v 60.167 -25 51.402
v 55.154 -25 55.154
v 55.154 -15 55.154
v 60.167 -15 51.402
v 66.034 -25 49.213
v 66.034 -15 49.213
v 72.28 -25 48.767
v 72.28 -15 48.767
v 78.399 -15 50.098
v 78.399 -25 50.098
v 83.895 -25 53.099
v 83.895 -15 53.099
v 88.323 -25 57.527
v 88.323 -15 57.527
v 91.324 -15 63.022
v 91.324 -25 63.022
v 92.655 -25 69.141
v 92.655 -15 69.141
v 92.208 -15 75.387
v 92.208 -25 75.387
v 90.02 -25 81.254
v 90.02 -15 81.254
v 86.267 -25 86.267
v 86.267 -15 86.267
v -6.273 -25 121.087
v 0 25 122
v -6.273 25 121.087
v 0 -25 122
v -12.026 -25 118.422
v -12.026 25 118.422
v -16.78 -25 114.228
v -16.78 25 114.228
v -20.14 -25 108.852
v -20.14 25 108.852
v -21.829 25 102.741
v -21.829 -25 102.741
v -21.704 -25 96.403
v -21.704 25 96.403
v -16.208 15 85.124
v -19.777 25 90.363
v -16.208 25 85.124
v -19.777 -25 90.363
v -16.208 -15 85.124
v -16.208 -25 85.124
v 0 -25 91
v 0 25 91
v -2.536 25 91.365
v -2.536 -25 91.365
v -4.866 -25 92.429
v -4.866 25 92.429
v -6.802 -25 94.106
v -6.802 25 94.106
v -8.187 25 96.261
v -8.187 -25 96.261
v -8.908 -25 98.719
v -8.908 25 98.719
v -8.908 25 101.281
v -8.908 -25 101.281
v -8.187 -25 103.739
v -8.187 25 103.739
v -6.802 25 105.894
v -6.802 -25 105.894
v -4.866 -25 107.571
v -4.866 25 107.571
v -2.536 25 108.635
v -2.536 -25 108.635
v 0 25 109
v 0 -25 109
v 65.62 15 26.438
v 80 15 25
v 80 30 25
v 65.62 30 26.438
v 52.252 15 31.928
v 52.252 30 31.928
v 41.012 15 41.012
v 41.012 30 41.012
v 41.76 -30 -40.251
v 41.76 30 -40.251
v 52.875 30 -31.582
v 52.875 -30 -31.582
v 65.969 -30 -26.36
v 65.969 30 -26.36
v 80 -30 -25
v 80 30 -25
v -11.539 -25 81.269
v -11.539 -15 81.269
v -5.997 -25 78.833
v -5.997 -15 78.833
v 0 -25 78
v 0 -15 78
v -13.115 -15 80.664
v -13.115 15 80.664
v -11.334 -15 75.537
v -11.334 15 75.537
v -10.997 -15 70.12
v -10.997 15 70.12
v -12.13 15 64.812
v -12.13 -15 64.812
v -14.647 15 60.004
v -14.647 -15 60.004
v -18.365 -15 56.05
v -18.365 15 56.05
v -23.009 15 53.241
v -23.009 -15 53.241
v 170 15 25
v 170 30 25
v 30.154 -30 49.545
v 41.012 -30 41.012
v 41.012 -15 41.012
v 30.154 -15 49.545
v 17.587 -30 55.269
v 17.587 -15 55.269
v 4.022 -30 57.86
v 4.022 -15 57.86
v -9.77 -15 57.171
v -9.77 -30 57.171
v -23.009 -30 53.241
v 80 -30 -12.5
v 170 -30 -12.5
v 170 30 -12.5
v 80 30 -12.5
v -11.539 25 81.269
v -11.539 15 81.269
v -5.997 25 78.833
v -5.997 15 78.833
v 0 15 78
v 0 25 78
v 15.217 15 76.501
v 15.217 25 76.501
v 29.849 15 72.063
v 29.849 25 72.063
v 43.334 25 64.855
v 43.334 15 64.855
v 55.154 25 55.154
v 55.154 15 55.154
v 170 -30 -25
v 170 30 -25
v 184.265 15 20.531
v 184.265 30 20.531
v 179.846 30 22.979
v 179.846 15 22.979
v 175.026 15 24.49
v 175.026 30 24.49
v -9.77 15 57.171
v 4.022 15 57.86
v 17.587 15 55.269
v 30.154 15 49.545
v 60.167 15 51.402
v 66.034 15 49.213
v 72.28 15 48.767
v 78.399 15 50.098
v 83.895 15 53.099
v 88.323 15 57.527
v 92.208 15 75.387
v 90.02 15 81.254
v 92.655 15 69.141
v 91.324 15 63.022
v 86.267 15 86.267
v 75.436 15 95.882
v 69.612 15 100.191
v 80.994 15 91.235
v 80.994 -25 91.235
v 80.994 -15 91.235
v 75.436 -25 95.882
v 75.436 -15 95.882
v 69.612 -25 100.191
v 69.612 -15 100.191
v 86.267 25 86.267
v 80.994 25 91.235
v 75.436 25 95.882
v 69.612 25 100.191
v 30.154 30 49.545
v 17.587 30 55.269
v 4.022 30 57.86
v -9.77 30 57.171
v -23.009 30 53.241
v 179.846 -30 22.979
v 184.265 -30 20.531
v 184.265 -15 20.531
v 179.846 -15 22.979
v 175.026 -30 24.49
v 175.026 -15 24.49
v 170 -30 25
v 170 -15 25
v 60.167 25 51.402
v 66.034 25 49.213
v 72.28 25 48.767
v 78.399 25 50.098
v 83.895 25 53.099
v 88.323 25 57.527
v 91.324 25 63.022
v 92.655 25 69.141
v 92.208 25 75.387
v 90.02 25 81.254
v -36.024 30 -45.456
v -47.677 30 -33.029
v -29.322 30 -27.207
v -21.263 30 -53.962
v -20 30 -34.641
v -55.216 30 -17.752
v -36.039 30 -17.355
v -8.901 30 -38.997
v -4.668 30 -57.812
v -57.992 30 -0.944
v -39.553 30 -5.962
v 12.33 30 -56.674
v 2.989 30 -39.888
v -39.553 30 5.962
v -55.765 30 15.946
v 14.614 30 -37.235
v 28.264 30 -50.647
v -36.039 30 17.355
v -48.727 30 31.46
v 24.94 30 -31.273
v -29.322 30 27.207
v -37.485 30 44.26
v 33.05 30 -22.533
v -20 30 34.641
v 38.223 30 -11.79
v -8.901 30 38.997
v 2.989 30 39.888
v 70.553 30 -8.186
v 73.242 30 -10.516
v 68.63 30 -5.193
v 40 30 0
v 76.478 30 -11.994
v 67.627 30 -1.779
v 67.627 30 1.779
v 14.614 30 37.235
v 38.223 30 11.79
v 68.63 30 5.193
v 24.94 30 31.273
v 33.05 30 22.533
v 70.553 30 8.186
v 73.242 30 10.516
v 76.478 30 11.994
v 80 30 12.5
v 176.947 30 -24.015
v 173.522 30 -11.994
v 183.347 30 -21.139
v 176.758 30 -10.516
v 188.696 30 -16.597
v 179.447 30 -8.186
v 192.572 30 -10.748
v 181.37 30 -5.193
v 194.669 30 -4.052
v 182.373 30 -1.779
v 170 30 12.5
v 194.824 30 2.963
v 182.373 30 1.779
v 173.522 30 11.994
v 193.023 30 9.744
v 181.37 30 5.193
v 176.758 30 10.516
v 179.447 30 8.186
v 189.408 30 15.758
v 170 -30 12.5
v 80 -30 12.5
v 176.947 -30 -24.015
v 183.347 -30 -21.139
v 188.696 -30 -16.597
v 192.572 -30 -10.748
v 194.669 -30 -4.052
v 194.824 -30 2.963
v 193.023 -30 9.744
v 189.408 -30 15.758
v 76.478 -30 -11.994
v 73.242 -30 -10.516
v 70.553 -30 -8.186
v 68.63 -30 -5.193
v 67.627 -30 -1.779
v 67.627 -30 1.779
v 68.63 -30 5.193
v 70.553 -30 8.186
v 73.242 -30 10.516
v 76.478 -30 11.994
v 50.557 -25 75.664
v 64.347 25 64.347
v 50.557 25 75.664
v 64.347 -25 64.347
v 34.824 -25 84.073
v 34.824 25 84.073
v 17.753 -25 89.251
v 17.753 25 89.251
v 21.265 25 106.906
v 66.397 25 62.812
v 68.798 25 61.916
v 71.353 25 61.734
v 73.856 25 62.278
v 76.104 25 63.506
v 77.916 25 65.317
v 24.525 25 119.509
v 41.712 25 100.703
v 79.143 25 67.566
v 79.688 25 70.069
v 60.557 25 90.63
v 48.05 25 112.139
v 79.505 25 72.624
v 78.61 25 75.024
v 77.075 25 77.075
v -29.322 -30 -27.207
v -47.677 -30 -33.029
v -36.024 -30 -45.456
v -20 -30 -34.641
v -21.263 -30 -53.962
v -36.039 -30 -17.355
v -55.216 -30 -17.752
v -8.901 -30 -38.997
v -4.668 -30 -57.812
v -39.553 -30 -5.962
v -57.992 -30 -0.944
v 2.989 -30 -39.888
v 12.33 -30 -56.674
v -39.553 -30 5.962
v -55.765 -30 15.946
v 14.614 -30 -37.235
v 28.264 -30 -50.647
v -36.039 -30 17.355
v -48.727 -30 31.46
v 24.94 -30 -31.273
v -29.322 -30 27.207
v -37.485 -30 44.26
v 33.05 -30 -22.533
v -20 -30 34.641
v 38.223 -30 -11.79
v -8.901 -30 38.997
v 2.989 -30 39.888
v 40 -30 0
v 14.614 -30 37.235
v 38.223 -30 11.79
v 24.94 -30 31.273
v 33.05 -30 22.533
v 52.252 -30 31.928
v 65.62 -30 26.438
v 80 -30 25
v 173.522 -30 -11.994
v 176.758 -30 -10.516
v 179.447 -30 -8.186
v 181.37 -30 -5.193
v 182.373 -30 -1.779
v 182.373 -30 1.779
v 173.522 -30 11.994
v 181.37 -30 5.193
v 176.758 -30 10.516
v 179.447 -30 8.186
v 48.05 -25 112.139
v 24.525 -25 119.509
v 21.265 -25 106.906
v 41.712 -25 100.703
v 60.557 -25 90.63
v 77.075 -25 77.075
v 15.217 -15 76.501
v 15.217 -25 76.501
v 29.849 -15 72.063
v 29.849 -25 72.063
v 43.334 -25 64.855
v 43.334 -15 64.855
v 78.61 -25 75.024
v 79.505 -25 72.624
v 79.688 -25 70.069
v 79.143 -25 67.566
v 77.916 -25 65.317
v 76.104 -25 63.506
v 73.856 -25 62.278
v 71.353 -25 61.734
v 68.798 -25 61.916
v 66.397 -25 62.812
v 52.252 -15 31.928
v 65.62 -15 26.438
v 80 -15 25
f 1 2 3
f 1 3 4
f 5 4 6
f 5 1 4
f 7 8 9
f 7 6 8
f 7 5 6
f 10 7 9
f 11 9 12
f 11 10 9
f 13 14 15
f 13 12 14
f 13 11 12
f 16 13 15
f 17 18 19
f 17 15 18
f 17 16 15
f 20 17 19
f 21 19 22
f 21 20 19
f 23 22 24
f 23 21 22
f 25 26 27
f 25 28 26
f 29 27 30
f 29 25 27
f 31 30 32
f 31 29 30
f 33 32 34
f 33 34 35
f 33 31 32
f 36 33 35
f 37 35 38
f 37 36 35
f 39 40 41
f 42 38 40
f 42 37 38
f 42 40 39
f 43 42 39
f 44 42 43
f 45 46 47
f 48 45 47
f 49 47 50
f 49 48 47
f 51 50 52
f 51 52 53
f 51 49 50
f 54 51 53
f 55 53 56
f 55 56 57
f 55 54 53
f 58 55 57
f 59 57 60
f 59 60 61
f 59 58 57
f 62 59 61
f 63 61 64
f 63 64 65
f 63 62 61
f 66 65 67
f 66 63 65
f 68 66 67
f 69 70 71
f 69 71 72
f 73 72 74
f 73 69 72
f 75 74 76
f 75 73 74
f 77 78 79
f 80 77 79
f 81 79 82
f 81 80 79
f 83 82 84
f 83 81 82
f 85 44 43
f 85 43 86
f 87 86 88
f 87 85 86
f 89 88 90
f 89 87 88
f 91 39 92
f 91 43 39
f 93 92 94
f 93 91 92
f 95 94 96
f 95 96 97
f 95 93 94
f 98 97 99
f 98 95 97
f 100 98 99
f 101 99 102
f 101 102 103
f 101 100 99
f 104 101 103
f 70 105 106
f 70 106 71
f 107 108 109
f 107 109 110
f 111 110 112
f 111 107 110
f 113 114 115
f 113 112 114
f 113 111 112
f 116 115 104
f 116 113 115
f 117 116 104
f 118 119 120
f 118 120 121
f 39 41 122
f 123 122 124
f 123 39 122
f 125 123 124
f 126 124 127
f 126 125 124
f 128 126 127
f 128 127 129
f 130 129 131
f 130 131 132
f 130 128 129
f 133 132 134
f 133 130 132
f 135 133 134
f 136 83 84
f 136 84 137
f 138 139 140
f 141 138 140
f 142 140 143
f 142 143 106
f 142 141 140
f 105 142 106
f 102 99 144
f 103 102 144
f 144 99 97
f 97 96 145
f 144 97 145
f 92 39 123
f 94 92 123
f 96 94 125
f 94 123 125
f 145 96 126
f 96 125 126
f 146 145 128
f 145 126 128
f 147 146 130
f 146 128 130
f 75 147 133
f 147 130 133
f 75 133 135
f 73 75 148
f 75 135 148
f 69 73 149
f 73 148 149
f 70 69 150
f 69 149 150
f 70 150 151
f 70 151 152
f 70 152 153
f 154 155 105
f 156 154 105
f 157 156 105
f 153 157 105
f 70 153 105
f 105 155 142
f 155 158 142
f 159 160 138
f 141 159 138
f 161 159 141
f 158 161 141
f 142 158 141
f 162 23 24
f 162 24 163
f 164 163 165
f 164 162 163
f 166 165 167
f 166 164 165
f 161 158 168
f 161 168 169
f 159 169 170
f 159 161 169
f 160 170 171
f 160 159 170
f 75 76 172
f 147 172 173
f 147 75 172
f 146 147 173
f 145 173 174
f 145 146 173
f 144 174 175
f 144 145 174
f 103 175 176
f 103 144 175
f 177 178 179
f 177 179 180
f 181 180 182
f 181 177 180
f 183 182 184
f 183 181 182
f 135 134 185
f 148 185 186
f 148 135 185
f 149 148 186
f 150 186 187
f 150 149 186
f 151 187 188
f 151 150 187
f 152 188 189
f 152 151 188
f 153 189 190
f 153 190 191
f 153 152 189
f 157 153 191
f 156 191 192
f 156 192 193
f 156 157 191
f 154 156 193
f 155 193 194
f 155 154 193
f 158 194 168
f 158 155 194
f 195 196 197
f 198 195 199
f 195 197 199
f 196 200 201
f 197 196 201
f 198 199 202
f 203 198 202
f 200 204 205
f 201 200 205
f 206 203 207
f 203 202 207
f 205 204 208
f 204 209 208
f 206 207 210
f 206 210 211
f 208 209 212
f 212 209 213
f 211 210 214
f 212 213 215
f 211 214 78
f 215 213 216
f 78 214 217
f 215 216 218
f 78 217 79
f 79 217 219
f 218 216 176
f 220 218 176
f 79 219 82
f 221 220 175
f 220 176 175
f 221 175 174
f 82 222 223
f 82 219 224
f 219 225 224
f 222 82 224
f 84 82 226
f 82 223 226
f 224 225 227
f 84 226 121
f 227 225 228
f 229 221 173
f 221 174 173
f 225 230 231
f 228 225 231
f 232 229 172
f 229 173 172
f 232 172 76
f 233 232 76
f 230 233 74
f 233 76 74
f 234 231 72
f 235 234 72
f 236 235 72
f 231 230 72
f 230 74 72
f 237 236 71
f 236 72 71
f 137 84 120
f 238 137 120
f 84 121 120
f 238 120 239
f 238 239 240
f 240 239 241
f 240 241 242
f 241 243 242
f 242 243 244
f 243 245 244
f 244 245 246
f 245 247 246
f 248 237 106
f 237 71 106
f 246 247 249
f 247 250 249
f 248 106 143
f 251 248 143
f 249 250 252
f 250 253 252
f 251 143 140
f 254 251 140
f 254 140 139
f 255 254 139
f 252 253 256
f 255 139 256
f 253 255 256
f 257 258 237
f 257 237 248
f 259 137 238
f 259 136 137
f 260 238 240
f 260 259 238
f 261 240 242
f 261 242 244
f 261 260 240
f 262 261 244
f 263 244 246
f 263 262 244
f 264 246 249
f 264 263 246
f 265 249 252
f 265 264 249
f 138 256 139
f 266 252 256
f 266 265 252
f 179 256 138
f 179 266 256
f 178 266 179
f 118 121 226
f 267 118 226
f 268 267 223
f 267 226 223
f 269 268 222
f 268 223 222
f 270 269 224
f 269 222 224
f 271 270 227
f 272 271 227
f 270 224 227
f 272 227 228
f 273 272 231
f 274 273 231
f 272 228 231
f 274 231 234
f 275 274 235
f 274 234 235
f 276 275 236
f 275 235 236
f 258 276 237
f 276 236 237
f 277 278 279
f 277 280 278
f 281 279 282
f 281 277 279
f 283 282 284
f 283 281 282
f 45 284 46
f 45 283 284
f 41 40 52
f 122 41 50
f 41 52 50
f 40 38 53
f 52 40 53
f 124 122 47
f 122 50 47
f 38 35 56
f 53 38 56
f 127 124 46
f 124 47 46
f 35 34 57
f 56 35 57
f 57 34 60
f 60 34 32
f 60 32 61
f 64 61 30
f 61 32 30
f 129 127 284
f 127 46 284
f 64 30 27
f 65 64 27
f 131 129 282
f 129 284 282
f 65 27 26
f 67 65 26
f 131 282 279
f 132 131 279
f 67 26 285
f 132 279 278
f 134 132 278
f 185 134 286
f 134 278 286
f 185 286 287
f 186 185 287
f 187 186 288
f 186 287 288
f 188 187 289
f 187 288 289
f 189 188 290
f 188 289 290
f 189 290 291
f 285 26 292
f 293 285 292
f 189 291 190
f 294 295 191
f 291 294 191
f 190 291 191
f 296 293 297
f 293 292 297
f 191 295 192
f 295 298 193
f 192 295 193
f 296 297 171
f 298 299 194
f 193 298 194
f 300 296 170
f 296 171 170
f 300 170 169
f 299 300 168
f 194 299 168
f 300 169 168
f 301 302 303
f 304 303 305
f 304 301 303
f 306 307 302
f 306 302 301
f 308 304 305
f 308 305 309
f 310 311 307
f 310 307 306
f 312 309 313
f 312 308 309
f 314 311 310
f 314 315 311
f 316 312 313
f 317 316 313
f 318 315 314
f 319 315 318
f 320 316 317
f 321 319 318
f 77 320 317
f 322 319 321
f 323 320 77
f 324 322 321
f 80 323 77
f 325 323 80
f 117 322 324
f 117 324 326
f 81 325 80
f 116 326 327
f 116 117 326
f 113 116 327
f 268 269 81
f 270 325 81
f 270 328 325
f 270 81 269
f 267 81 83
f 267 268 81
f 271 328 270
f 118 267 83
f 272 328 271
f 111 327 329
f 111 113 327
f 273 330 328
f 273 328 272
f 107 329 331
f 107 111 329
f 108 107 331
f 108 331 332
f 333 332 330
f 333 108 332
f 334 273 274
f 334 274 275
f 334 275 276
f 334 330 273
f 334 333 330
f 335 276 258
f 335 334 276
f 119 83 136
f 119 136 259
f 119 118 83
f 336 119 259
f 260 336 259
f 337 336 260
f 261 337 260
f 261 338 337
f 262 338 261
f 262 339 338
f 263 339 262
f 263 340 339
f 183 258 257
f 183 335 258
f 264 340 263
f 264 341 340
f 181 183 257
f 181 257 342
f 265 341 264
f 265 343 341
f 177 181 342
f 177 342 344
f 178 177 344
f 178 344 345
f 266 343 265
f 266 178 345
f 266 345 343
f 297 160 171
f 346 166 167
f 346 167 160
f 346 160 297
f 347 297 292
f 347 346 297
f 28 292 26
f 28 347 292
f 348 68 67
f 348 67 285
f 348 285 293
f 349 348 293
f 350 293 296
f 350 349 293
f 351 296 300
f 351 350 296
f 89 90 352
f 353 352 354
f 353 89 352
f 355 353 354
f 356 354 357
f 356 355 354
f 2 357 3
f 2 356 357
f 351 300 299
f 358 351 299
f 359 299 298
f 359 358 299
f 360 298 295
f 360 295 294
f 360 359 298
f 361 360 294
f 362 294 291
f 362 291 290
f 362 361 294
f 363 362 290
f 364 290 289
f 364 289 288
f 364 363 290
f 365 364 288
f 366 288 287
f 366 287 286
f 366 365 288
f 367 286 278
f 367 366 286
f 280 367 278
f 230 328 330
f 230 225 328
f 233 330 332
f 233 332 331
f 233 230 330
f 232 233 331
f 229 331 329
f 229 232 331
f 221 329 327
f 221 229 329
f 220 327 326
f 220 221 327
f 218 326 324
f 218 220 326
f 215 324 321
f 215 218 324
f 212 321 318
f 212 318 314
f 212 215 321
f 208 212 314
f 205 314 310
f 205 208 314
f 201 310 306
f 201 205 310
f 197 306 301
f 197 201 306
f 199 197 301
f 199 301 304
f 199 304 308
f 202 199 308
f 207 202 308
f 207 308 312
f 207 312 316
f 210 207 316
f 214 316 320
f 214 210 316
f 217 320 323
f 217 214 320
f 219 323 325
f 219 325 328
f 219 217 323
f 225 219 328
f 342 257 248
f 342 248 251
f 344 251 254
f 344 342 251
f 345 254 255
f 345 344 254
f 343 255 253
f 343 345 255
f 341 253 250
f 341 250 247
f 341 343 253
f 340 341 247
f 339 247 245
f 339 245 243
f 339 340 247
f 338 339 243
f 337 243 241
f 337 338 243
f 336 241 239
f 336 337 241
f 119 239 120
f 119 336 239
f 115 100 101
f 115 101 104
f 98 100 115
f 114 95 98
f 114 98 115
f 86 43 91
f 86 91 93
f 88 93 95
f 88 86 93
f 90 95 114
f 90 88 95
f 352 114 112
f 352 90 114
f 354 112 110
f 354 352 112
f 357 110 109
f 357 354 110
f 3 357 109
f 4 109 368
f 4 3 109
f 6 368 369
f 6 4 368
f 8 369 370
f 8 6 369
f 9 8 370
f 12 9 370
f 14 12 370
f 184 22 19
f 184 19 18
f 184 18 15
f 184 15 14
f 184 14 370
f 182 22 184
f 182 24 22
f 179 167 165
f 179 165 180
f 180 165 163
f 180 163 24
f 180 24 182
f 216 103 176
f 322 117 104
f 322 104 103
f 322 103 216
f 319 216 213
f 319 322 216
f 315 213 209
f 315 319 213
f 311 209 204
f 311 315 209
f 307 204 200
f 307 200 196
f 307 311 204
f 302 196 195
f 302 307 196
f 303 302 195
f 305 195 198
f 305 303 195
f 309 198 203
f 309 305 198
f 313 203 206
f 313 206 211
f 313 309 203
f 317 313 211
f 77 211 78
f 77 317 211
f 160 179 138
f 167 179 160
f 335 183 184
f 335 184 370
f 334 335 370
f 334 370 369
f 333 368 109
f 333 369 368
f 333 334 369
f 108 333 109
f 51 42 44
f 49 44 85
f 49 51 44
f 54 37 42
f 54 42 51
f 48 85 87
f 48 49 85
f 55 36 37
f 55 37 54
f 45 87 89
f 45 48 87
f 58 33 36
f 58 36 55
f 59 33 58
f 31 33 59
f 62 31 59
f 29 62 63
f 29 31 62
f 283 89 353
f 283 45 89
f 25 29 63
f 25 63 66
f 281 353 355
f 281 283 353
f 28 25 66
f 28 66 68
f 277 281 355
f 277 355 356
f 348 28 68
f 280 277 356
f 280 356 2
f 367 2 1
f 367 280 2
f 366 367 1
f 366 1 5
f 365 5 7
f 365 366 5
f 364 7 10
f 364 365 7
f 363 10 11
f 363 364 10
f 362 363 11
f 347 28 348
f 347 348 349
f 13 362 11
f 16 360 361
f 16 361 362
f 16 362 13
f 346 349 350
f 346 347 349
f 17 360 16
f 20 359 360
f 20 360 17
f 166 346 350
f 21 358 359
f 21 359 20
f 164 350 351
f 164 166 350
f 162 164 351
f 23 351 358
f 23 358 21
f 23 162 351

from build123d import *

# Parameters (mm, degrees)
F0_R     = 40
F1_DEPTH = 30
F2_DEPTH = 15
F3_DEPTH = 25


with BuildPart() as f1:
    # F0 (on Front) → F1 (new body, symmetric)
    with BuildSketch(Plane.XZ):
        with BuildLine():
            ThreePointArc((80, 25), (58.736468, 28.697259), (41.012193, 41.012193))
            ThreePointArc((41.012193, 41.012193), (10.882045, 56.970002), (-23.008546, 53.241026))
            ThreePointArc((-23.008546, 53.241026), (-47.67685, -33.029047), (41.759702, -40.250805))
            ThreePointArc((41.759702, -40.250805), (59.237365, -28.506986), (80, -25))
            Line((80, -25), (170, -25))
            ThreePointArc((170, -25), (193.856579, -7.474199), (184.264706, 20.530908))
            ThreePointArc((184.264706, 20.530908), (177.474199, 23.856579), (170, 25))
            Line((170, 25), (80, 25))
        make_face()
        Circle(F0_R, mode=Mode.SUBTRACT)
        with BuildLine():
            ThreePointArc((80, -12.5), (67.5, 0), (80, 12.5))
            Line((80, 12.5), (170, 12.5))
            ThreePointArc((170, 12.5), (182.5, 0), (170, -12.5))
            Line((170, -12.5), (80, -12.5))
        make_face(mode=Mode.SUBTRACT)
    extrude(amount=F1_DEPTH, both=True)

    # F0 (on Front) → F2 (join, symmetric)
    with BuildSketch(Plane.XZ):
        with BuildLine():
            ThreePointArc((-23.008546, 53.241026), (10.882045, 56.970002), (41.012193, 41.012193))
            ThreePointArc((41.012193, 41.012193), (58.736468, 28.697259), (80, 25))
            Line((80, 25), (170, 25))
            ThreePointArc((170, 25), (177.474199, 23.856579), (184.264706, 20.530908))
            Line((184.264706, 20.530908), (69.611765, 100.190829))
            ThreePointArc((69.611765, 100.190829), (78.249713, 93.60012), (86.267027, 86.267027))
            ThreePointArc((86.267027, 86.267027), (86.267027, 55.154329), (55.154329, 55.154329))
            ThreePointArc((55.154329, 55.154329), (29.849308, 72.062604), (0, 78))
            ThreePointArc((0, 78), (-8.852226, 79.859541), (-16.207991, 85.12381))
            ThreePointArc((-16.207991, 85.12381), (-11.382532, 67.427879), (-23.008546, 53.241026))
        make_face()
    extrude(amount=F2_DEPTH, both=True)

    # F0 (on Front) → F3 (join, symmetric)
    with BuildSketch(Plane.XZ):
        with BuildLine():
            ThreePointArc((0, 122), (-20.140459, 108.852226), (-16.207991, 85.12381))
            ThreePointArc((-16.207991, 85.12381), (-8.852226, 79.859541), (0, 78))
            ThreePointArc((0, 78), (29.849308, 72.062604), (55.154329, 55.154329))
            ThreePointArc((55.154329, 55.154329), (86.267027, 55.154329), (86.267027, 86.267027))
            ThreePointArc((86.267027, 86.267027), (78.249713, 93.60012), (69.611765, 100.190829))
            ThreePointArc((69.611765, 100.190829), (36.474093, 116.420104), (0, 122))
        make_face()
        with BuildLine():
            ThreePointArc((0, 109), (41.712494, 100.702869), (77.074639, 77.074639))
            ThreePointArc((77.074639, 77.074639), (77.074639, 64.346717), (64.346717, 64.346717))
            ThreePointArc((64.346717, 64.346717), (34.824192, 84.073037), (0, 91))
            ThreePointArc((0, 91), (-9, 100), (0, 109))
        make_face(mode=Mode.SUBTRACT)
    extrude(amount=F3_DEPTH, both=True)


solid = f1.part
